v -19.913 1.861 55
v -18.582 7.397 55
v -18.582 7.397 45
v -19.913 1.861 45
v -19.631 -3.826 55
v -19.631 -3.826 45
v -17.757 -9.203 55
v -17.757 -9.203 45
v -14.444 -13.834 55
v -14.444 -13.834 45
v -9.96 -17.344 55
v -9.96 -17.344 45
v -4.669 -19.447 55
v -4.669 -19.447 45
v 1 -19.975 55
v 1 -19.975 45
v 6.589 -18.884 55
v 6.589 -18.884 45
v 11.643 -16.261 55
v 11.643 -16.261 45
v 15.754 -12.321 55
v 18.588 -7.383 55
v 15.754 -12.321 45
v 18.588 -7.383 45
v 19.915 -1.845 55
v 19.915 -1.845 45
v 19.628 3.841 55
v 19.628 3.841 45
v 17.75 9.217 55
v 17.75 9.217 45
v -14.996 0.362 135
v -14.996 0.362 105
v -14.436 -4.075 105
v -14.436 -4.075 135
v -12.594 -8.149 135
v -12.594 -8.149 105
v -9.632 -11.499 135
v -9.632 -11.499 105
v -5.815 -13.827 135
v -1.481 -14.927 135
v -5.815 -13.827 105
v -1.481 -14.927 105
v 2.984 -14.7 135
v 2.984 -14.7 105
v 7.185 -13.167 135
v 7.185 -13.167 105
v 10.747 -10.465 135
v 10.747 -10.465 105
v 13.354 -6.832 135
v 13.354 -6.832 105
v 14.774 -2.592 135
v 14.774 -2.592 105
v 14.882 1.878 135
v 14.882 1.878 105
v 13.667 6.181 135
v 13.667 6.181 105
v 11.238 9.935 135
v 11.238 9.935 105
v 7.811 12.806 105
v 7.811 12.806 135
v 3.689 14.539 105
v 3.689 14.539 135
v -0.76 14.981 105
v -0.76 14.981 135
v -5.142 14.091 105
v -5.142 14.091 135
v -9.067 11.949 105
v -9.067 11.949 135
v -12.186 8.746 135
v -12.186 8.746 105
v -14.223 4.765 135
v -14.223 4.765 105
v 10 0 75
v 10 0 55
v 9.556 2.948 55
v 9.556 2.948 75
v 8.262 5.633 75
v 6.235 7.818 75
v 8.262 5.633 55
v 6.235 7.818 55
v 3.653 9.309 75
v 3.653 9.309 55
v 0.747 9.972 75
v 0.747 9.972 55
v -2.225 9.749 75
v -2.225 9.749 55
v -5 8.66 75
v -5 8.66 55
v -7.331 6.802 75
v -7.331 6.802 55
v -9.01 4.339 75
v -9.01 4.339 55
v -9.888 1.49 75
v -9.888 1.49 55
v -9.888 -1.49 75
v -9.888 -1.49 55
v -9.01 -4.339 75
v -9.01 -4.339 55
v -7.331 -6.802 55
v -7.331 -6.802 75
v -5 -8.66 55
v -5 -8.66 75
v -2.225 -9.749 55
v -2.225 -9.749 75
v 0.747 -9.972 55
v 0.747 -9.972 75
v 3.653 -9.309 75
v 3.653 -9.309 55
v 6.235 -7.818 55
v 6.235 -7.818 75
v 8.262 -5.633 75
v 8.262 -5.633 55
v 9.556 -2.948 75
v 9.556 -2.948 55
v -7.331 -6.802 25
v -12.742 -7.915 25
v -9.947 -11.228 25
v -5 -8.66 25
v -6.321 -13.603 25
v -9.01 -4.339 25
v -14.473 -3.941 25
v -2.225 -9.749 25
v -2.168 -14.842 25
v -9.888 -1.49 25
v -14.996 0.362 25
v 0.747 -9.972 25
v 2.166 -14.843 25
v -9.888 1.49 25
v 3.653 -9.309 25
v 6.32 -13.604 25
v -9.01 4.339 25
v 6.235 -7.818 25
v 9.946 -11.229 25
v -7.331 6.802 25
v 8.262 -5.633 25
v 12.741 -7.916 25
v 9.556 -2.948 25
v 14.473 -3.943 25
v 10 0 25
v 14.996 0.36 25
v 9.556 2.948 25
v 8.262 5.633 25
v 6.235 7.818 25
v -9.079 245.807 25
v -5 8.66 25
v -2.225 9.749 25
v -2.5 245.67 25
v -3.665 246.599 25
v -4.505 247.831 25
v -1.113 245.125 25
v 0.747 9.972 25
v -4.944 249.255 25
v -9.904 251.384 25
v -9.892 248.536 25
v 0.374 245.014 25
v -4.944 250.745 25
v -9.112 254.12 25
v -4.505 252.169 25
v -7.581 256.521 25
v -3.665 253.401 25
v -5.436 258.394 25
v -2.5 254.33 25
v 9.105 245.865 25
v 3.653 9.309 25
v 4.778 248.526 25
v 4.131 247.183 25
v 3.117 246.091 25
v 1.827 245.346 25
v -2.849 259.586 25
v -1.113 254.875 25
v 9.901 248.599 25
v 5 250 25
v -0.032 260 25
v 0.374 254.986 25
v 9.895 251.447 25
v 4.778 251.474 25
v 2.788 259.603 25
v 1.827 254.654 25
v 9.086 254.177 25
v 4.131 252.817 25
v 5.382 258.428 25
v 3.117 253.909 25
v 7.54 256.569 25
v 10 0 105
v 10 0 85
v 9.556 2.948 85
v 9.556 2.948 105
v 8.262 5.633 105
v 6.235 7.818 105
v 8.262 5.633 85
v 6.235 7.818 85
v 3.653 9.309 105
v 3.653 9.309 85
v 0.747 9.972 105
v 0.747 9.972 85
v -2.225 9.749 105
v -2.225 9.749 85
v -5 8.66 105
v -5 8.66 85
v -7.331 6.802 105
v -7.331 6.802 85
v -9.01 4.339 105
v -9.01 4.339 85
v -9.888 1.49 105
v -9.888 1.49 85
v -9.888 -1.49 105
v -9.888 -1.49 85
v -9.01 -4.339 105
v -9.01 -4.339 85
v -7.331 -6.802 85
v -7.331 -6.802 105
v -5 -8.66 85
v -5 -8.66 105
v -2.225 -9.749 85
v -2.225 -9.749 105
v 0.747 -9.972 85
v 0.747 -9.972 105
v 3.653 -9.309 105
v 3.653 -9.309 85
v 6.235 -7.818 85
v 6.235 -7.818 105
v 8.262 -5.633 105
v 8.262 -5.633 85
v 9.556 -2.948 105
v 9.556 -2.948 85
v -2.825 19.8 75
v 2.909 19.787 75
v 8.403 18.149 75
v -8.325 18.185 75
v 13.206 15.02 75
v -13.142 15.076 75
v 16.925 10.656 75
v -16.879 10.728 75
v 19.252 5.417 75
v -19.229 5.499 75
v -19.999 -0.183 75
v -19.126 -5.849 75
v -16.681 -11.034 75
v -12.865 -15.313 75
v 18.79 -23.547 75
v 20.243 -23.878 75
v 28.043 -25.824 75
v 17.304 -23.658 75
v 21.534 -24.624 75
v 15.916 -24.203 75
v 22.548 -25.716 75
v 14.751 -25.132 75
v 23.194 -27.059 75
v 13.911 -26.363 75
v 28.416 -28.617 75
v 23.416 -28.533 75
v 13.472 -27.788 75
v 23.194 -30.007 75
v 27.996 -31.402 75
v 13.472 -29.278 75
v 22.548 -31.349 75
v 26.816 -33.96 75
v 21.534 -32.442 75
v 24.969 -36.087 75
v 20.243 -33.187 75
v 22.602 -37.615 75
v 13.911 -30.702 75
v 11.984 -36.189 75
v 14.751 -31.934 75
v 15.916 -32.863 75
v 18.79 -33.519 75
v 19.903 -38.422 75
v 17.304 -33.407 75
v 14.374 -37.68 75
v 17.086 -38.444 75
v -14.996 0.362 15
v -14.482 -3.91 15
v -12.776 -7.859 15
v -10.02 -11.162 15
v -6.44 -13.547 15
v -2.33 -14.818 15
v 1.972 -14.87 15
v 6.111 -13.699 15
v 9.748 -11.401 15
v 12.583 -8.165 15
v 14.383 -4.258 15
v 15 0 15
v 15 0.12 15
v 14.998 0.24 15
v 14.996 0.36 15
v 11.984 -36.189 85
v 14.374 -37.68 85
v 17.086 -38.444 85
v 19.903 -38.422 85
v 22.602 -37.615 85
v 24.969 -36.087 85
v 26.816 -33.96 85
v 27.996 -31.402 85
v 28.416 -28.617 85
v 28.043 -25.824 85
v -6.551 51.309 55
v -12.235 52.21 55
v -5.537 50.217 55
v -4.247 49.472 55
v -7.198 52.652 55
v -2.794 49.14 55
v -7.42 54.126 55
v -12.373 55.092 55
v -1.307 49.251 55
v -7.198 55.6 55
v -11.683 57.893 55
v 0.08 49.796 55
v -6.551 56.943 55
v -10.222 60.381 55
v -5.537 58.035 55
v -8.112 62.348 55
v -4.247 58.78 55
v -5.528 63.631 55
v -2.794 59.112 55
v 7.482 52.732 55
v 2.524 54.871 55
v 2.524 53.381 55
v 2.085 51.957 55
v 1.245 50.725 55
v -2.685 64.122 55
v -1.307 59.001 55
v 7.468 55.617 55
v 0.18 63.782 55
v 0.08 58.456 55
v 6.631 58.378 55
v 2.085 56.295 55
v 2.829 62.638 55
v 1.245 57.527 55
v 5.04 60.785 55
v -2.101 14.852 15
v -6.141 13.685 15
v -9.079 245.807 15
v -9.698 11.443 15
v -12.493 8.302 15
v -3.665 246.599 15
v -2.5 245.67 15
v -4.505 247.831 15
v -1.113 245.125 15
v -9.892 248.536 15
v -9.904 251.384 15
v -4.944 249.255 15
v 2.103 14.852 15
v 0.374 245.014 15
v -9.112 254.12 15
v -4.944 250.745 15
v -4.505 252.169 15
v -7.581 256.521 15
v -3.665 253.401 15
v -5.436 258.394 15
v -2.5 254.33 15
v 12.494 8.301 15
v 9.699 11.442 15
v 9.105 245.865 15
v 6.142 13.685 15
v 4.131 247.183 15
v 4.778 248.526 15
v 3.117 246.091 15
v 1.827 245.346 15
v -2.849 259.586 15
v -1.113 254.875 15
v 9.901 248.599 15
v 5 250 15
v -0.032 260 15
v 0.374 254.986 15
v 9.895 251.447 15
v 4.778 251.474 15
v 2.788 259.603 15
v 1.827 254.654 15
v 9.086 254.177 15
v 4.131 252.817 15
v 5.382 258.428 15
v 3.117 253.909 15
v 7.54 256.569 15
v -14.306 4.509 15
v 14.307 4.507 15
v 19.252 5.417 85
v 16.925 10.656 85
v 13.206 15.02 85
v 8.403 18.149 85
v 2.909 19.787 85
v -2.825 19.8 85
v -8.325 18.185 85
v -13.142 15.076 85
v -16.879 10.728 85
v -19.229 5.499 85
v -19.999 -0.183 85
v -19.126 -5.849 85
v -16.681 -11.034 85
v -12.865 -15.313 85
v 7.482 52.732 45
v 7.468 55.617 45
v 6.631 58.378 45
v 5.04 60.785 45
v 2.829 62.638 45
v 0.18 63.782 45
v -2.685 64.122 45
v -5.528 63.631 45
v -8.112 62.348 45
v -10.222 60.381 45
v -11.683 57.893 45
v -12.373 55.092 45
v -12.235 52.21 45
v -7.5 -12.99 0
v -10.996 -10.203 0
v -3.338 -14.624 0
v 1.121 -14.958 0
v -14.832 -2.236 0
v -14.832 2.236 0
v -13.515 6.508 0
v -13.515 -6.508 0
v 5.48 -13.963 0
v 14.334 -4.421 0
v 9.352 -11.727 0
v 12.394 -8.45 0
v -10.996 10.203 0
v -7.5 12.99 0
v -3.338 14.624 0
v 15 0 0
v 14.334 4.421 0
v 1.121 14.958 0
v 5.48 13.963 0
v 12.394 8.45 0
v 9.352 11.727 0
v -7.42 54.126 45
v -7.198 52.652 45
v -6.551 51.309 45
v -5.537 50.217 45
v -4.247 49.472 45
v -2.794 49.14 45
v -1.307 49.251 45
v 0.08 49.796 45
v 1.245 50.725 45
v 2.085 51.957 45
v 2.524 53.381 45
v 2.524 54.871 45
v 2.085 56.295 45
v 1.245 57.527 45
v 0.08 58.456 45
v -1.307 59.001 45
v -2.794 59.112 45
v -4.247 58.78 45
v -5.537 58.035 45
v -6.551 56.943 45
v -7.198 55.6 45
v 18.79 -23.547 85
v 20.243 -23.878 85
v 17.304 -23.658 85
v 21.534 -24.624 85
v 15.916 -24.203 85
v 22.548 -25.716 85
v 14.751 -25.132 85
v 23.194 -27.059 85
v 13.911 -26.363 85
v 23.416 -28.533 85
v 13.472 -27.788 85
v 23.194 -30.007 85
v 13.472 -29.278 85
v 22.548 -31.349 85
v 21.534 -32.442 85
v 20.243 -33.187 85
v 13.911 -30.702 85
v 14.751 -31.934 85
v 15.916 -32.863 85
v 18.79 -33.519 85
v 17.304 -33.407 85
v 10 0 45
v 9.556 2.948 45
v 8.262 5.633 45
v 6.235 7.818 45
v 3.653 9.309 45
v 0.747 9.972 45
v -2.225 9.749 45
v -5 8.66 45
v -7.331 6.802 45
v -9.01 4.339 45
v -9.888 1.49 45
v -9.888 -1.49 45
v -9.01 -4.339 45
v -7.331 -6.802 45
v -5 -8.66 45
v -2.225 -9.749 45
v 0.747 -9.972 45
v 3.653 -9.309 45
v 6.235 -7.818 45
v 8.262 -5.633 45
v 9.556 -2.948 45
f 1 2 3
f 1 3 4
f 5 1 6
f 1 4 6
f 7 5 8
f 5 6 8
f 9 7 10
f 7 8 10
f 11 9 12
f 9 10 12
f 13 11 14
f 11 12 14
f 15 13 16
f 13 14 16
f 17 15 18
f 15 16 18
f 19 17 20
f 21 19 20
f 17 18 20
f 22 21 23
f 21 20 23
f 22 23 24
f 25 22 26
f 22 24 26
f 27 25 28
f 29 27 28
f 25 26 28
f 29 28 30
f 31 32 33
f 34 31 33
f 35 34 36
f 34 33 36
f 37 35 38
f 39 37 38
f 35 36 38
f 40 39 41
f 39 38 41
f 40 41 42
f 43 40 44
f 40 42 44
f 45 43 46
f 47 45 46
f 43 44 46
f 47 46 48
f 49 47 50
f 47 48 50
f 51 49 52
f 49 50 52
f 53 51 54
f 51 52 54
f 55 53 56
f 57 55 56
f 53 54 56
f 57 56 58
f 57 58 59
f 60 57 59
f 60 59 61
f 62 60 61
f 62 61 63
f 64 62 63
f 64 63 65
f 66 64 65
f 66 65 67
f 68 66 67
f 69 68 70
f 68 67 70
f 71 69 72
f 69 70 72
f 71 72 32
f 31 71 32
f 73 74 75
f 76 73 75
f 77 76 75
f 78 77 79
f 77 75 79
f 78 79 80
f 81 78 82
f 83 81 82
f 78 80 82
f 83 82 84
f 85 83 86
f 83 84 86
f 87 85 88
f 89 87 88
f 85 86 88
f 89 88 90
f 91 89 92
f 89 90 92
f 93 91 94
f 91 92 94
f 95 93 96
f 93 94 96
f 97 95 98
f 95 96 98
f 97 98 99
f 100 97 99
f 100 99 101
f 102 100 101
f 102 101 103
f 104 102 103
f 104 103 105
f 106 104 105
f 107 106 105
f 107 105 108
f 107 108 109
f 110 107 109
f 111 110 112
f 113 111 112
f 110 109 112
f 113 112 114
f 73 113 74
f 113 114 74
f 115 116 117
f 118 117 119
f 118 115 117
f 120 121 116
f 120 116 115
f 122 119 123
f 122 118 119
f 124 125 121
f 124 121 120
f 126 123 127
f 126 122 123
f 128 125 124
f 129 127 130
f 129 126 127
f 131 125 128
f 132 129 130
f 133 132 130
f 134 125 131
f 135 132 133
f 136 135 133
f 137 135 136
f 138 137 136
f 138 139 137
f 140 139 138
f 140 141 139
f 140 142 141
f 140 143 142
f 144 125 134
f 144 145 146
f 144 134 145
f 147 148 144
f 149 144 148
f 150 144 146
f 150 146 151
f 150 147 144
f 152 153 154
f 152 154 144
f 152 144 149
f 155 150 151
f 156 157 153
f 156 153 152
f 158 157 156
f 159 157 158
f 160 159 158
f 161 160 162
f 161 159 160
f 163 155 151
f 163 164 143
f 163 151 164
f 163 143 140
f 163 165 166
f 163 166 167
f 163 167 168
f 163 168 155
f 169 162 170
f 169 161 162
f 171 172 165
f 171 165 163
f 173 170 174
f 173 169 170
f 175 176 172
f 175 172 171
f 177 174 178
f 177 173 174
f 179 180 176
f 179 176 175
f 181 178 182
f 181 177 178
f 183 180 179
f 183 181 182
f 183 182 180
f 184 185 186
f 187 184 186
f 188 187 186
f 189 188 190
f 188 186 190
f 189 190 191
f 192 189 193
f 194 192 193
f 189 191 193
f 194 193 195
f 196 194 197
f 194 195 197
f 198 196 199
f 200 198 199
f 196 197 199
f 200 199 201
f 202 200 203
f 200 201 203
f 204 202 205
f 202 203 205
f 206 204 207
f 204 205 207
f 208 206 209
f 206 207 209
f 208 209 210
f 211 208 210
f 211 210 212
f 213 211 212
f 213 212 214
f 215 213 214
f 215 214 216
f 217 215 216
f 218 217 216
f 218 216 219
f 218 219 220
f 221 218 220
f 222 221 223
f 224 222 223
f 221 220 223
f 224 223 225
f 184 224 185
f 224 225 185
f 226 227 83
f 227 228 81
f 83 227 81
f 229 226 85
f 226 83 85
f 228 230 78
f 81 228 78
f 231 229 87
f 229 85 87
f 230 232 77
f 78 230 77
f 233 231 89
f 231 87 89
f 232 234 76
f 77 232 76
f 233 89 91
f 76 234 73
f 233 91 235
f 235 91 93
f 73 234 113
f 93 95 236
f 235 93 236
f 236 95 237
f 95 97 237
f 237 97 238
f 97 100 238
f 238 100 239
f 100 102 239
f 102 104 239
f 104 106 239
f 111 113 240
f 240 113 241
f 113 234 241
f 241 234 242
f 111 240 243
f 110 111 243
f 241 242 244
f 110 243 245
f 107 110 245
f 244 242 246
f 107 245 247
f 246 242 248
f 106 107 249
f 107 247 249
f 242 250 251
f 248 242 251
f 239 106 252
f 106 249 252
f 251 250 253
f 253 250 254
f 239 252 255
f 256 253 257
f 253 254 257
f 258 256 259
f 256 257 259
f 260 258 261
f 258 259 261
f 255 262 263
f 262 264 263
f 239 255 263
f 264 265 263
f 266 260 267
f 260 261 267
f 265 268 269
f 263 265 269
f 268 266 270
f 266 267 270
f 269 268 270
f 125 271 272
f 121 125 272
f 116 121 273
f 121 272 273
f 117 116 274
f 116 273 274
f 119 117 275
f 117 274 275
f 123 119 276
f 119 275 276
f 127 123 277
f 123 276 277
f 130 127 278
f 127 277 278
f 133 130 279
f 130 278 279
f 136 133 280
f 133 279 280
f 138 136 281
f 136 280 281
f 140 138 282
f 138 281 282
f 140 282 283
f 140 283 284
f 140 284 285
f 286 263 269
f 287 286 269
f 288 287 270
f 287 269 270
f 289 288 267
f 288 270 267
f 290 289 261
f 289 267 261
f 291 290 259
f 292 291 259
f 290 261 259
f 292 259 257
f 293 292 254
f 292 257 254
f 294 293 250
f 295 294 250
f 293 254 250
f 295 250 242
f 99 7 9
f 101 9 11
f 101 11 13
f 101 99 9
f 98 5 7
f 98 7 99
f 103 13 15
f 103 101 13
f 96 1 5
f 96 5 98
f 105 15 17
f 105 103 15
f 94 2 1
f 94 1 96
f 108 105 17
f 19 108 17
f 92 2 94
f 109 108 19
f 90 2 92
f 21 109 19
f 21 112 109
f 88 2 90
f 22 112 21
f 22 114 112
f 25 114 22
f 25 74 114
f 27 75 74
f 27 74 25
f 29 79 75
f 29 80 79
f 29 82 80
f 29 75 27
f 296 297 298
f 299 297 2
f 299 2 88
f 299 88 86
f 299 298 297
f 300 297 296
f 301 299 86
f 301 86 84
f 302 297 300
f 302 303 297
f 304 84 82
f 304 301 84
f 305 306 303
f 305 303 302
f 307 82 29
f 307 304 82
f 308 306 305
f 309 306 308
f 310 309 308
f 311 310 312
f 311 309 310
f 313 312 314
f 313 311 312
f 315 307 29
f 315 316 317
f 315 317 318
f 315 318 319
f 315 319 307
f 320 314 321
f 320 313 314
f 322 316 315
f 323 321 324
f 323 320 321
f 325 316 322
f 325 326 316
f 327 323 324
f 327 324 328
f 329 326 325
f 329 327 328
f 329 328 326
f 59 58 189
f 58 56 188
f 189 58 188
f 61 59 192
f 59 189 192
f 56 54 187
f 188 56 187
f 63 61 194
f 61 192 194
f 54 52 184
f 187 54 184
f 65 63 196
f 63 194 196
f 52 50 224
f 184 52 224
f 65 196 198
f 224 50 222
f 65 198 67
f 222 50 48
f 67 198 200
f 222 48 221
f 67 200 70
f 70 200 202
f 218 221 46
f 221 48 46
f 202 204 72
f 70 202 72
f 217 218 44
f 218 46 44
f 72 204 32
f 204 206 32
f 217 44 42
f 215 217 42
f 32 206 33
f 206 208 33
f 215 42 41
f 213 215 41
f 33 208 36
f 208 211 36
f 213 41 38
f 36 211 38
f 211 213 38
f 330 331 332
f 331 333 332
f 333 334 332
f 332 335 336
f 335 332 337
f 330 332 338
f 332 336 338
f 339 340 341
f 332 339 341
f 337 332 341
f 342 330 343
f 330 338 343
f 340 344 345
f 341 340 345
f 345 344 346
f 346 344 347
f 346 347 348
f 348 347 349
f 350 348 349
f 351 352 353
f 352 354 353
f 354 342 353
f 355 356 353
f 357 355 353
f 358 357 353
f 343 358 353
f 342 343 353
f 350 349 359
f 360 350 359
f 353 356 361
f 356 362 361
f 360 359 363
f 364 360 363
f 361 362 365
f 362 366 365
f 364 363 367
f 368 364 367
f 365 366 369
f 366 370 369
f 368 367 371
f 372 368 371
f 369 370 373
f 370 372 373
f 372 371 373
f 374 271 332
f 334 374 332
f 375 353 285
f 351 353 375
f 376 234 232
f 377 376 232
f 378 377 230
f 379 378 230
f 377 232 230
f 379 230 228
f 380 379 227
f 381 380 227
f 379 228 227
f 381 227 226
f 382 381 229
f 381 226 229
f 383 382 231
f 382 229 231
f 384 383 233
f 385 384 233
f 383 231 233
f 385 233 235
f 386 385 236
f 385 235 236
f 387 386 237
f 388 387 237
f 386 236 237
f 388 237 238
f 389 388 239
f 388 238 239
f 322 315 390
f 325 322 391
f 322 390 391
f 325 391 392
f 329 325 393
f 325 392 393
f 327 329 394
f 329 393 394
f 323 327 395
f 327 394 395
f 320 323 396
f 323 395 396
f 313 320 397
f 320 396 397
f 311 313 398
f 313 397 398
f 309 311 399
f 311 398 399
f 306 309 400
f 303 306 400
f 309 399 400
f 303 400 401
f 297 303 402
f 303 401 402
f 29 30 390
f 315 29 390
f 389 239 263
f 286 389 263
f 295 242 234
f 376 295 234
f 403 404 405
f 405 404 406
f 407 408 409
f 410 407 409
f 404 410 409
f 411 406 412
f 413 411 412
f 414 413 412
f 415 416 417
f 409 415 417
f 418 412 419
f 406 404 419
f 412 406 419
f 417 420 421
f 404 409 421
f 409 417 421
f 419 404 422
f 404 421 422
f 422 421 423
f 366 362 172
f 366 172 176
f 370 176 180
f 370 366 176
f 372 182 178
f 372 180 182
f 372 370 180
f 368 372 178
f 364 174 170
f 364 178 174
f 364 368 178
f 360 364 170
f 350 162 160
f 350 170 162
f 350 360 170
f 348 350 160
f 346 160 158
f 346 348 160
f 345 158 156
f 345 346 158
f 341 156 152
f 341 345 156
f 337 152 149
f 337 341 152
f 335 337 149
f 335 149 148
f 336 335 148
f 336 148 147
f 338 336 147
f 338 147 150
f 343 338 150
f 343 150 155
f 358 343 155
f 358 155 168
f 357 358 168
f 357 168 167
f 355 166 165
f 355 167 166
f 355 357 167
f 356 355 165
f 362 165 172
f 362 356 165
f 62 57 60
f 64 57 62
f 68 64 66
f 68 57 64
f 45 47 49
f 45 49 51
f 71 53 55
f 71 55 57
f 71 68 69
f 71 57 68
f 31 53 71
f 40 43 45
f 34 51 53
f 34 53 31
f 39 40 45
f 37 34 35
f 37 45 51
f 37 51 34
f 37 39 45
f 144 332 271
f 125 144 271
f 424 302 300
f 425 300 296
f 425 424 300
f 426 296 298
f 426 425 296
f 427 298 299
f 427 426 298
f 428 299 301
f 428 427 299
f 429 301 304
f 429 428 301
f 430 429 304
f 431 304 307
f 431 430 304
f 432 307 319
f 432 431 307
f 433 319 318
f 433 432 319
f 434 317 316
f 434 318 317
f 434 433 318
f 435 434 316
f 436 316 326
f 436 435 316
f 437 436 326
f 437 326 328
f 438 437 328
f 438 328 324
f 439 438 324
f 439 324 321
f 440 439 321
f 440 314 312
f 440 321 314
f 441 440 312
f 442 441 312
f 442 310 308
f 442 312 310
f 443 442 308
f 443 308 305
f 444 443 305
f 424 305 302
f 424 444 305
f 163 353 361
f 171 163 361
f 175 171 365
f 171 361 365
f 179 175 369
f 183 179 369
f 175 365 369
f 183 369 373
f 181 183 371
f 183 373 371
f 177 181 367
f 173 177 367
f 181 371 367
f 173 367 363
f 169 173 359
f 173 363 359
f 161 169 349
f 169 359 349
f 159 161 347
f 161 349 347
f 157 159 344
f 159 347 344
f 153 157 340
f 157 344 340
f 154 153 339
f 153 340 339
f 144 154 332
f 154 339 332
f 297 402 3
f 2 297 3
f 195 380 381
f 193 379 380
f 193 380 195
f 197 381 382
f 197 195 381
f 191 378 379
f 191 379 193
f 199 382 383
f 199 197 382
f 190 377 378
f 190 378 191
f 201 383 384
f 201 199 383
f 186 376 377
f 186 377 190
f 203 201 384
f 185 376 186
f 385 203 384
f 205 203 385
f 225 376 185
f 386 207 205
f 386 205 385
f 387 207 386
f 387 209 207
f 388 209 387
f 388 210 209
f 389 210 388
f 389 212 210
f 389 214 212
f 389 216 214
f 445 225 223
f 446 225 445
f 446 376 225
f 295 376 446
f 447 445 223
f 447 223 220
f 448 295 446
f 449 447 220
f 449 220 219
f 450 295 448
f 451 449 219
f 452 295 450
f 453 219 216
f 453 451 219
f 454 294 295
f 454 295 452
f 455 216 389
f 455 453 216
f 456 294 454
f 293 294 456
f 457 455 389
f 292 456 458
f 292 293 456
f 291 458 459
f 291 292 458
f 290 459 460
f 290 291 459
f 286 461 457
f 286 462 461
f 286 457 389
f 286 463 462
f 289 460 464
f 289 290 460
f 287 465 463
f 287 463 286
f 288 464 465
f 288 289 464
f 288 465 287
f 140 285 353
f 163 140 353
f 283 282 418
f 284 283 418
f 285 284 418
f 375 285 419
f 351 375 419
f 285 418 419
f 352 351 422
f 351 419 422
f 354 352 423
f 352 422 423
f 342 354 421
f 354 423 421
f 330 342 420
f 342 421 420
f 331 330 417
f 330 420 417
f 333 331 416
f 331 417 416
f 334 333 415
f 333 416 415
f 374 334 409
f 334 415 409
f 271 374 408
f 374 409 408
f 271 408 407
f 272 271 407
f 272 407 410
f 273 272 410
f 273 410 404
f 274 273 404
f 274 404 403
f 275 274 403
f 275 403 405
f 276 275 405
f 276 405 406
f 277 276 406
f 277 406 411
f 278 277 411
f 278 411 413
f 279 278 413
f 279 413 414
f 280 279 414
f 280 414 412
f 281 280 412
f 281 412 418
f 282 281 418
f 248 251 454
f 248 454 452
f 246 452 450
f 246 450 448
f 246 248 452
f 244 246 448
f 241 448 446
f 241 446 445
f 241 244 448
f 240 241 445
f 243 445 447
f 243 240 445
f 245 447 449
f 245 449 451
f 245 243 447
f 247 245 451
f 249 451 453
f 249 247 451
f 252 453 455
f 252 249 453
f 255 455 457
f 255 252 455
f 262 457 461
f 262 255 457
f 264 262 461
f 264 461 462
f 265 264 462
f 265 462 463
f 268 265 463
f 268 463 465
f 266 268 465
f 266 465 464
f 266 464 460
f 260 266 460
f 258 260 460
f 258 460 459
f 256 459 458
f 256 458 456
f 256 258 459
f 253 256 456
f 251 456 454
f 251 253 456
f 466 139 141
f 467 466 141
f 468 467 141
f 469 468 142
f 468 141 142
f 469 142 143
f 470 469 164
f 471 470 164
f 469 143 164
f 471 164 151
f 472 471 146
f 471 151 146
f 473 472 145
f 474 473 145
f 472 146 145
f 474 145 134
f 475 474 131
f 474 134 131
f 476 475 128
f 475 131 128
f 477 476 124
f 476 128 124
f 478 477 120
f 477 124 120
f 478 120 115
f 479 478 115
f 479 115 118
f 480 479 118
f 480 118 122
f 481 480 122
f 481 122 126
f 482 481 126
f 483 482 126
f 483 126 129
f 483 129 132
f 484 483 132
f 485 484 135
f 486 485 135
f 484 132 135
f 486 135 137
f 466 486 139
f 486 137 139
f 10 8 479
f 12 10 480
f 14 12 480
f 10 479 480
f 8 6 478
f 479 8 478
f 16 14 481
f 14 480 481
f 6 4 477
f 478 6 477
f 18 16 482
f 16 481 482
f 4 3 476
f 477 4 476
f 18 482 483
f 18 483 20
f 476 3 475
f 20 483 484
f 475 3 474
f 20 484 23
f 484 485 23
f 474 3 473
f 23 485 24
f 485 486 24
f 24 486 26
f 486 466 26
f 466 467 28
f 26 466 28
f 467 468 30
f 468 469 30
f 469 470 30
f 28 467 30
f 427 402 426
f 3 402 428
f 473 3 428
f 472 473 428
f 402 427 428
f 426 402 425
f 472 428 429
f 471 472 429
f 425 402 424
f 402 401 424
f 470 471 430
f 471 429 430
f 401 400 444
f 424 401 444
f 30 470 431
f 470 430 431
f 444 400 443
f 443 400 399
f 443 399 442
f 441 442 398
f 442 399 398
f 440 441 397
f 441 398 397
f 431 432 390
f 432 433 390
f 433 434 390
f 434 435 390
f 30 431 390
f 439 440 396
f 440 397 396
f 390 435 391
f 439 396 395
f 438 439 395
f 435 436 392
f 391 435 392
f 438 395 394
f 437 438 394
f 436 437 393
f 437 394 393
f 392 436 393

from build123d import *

# Parameters (mm, degrees)
ESBO_O1_R                  = 15
RESSALTO_EXTRUS_O1_DEPTH   = 15
RESSALTO_EXTRUS_O2_DEPTH   = 10
ESBO_O4_R                  = 10
RESSALTO_EXTRUS_O3_DEPTH   = 20
CORTE_EXTRUS_O3_DEPTH      = 262.629509039
CORTE_EXTRUS_O3_DEPTH_BACK = 262.629509039
ESBO_O9_R                  = 5
RESSALTO_EXTRUS_O6_DEPTH   = 10
CORTE_EXTRUS_O4_DEPTH      = 267.505159425
CORTE_EXTRUS_O4_DEPTH_BACK = 10
ESBO_O12_R                 = 5
ESBO_O13_R                 = 10
RESSALTO_EXTRUS_O7_DEPTH   = 20
ESBO_O14_R                 = 5
RESSALTO_EXTRUS_O8_DEPTH   = 10
ESBO_O15_R                 = 10
RESSALTO_EXTRUS_O9_DEPTH   = 20
ESBO_O17_R                 = 15
RESSALTO_EXTRUS_O10_DEPTH  = 30


with BuildPart() as part:
    # Esboço1 → Ressalto-extrusão1 (new body)
    with BuildSketch(Plane.XY):
        Circle(ESBO_O1_R)
    extrude(amount=RESSALTO_EXTRUS_O1_DEPTH)

    # Esboço2 → Ressalto-extrusão2 (add)
    with BuildSketch(Plane.XY.offset(15)):
        with BuildLine():
            Line((-9.078599197, 245.807263828), (-14.995643171, 0.361505045))
            ThreePointArc((-14.995643171, 0.361505045), (-0.00084936, -14.999999976), (14.995684014, 0.359806815))
            Line((14.995684014, 0.359806815), (9.105027046, 245.864968865))
            ThreePointArc((9.105027046, 245.864968865), (-0.031734455, 259.999949646), (-9.078599197, 245.807263828))
        make_face()
    extrude(amount=RESSALTO_EXTRUS_O2_DEPTH)

    # Esboço4 → Ressalto-extrusão3 (add)
    with BuildSketch(Plane.XY.offset(25)):
        Circle(ESBO_O4_R)
    extrude(amount=RESSALTO_EXTRUS_O3_DEPTH)

    # Esboço9 → Corte-extrusão3 (cut, two sides: drawn at the far end of the back side and taken through both)
    with BuildSketch(Plane.XY.offset(25).offset(-CORTE_EXTRUS_O3_DEPTH_BACK)):
        with Locations((0, 250)):
            Circle(ESBO_O9_R)
    extrude(amount=CORTE_EXTRUS_O3_DEPTH + CORTE_EXTRUS_O3_DEPTH_BACK, mode=Mode.SUBTRACT)

    # Esboço11 → Ressalto-extrusão6 (add)
    with BuildSketch(Plane(origin=(0, 0, 45), x_dir=(0.999001995685138, 0.044665564108286114, 0), z_dir=(0, 0, 1))):
        with BuildLine():
            Line((-9.890512739, 52.704277206), (-18.232895862, 8.219580797))
            ThreePointArc((-18.232895862, 8.219580797), (0.107287246, -19.999712234), (18.143662158, 8.414720642))
            Line((18.143662158, 8.414720642), (9.830225014, 52.345149552))
            ThreePointArc((9.830225014, 52.345149552), (0.182076414, 64.178342272), (-9.890512739, 52.704277206))
        make_face()
    extrude(amount=RESSALTO_EXTRUS_O6_DEPTH)

    # Esboço12 → Corte-extrusão4 (cut, two sides: drawn at the far end of the back side and taken through both)
    with BuildSketch(Plane.XY.offset(55).offset(-CORTE_EXTRUS_O4_DEPTH_BACK)):
        with Locations(Location((-2.419980263, 54.125928126, 0), (0, 0, 180))):
            Circle(ESBO_O12_R)
    extrude(amount=CORTE_EXTRUS_O4_DEPTH + CORTE_EXTRUS_O4_DEPTH_BACK, mode=Mode.SUBTRACT)

    # Esboço13 → Ressalto-extrusão7 (add)
    with BuildSketch(Plane.XY.offset(55)):
        Circle(ESBO_O13_R)
    extrude(amount=RESSALTO_EXTRUS_O7_DEPTH)

    # Esboço14 → Ressalto-extrusão8 (add)
    with BuildSketch(Plane(origin=(0, 0, 75), x_dir=(-0.8401882150112437, -0.5422949044166098, 0), z_dir=(0, 0, 1))):
        with BuildLine():
            Line((-9.556625494, 36.904640754), (-19.113250988, 5.889281508))
            ThreePointArc((-19.113250988, 5.889281508), (0, -20), (19.113250988, 5.889281508))
            Line((19.113250988, 5.889281508), (9.556625494, 36.904640754))
            ThreePointArc((9.556625494, 36.904640754), (0, 43.96), (-9.556625494, 36.904640754))
        make_face()
        with Locations(Location((0, 33.96, 0), (0, 0, 147.16))):
            Circle(ESBO_O14_R, mode=Mode.SUBTRACT)
    extrude(amount=RESSALTO_EXTRUS_O8_DEPTH)

    # Esboço15 → Ressalto-extrusão9 (add)
    with BuildSketch(Plane.XY.offset(85)):
        Circle(ESBO_O15_R)
    extrude(amount=RESSALTO_EXTRUS_O9_DEPTH)

    # Esboço17 → Ressalto-extrusão10 (add)
    with BuildSketch(Plane.XY.offset(105)):
        with Locations(Location((0, 0, 0), (0, 0, 178.619018737))):
            Circle(ESBO_O17_R)
    extrude(amount=RESSALTO_EXTRUS_O10_DEPTH)


solid = part.part
